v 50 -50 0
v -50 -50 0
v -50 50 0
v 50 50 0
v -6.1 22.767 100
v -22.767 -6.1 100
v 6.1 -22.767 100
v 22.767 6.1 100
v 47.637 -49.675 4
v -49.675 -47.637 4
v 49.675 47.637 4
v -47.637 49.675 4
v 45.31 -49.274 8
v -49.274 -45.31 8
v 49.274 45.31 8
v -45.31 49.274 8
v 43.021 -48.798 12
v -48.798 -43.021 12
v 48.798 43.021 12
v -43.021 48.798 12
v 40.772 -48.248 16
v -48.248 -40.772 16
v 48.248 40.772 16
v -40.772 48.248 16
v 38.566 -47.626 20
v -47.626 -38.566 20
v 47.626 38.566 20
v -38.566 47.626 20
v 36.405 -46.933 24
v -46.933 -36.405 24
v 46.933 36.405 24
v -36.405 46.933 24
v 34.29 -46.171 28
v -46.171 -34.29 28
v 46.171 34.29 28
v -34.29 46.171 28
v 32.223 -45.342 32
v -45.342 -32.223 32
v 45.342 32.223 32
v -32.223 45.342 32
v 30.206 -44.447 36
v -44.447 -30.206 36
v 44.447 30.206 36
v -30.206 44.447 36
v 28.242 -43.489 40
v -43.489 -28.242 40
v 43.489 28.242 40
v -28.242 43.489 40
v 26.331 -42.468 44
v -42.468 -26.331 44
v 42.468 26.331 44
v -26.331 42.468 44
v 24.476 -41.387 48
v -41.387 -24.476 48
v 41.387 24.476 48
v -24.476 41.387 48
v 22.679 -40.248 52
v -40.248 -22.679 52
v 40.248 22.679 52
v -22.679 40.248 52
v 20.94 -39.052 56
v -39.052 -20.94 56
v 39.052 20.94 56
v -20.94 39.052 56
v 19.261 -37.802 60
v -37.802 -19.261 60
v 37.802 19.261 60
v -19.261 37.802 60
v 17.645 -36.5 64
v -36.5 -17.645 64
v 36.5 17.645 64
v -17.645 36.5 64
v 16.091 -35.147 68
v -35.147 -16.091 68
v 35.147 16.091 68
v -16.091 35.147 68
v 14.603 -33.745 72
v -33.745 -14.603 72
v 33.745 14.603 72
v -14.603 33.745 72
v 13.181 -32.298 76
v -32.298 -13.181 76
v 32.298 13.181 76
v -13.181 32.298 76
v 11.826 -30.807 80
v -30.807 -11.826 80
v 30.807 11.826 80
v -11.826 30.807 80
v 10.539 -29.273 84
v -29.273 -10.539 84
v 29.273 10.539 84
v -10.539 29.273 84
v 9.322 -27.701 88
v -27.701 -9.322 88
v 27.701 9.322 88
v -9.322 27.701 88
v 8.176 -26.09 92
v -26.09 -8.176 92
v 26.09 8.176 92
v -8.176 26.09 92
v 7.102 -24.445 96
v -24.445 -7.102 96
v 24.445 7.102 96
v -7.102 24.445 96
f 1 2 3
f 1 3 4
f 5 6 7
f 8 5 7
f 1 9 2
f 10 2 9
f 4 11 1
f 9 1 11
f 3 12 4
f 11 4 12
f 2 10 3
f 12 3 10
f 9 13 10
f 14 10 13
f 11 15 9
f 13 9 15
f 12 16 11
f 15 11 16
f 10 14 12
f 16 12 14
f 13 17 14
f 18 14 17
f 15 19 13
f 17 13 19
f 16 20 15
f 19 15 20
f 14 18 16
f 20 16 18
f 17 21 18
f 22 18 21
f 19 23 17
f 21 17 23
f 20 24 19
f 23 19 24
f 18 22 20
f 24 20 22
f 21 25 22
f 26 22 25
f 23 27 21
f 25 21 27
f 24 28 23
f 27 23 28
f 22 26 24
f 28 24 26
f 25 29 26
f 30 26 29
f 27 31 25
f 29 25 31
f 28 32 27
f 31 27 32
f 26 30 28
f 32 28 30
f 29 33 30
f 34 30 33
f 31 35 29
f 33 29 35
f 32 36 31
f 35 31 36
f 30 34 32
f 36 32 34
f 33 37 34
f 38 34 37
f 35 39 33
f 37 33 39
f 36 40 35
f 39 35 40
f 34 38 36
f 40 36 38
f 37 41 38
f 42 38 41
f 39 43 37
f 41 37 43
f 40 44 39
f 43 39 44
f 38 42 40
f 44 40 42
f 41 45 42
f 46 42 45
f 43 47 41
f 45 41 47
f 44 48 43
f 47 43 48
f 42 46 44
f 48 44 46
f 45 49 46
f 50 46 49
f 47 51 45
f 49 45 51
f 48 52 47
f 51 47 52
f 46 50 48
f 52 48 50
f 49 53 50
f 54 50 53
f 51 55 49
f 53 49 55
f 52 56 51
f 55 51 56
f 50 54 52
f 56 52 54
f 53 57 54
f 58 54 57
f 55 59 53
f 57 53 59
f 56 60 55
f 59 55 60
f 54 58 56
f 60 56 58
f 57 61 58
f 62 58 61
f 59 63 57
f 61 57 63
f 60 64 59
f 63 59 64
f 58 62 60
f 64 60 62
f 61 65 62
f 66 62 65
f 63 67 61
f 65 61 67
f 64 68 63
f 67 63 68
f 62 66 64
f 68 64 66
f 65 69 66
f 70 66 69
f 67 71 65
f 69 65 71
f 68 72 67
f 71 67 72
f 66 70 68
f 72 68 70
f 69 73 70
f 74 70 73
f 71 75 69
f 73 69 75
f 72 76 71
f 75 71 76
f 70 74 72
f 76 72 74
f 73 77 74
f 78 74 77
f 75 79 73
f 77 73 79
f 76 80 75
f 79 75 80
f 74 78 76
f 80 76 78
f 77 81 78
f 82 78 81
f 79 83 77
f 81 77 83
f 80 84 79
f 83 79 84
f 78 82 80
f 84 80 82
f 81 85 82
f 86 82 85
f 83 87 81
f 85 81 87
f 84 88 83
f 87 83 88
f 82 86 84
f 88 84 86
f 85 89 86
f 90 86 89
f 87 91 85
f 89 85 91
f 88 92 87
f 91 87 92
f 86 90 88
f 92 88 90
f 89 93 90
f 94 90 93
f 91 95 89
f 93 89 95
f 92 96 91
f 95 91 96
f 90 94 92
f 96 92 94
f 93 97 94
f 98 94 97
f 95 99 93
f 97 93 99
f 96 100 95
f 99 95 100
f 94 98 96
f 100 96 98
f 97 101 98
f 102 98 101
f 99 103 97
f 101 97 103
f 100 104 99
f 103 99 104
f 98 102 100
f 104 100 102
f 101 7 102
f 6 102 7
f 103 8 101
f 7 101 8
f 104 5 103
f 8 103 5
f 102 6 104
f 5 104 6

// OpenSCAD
linear_extrude(100, twist=30, slices=25, scale=1/3)
	square(100, center=true);
